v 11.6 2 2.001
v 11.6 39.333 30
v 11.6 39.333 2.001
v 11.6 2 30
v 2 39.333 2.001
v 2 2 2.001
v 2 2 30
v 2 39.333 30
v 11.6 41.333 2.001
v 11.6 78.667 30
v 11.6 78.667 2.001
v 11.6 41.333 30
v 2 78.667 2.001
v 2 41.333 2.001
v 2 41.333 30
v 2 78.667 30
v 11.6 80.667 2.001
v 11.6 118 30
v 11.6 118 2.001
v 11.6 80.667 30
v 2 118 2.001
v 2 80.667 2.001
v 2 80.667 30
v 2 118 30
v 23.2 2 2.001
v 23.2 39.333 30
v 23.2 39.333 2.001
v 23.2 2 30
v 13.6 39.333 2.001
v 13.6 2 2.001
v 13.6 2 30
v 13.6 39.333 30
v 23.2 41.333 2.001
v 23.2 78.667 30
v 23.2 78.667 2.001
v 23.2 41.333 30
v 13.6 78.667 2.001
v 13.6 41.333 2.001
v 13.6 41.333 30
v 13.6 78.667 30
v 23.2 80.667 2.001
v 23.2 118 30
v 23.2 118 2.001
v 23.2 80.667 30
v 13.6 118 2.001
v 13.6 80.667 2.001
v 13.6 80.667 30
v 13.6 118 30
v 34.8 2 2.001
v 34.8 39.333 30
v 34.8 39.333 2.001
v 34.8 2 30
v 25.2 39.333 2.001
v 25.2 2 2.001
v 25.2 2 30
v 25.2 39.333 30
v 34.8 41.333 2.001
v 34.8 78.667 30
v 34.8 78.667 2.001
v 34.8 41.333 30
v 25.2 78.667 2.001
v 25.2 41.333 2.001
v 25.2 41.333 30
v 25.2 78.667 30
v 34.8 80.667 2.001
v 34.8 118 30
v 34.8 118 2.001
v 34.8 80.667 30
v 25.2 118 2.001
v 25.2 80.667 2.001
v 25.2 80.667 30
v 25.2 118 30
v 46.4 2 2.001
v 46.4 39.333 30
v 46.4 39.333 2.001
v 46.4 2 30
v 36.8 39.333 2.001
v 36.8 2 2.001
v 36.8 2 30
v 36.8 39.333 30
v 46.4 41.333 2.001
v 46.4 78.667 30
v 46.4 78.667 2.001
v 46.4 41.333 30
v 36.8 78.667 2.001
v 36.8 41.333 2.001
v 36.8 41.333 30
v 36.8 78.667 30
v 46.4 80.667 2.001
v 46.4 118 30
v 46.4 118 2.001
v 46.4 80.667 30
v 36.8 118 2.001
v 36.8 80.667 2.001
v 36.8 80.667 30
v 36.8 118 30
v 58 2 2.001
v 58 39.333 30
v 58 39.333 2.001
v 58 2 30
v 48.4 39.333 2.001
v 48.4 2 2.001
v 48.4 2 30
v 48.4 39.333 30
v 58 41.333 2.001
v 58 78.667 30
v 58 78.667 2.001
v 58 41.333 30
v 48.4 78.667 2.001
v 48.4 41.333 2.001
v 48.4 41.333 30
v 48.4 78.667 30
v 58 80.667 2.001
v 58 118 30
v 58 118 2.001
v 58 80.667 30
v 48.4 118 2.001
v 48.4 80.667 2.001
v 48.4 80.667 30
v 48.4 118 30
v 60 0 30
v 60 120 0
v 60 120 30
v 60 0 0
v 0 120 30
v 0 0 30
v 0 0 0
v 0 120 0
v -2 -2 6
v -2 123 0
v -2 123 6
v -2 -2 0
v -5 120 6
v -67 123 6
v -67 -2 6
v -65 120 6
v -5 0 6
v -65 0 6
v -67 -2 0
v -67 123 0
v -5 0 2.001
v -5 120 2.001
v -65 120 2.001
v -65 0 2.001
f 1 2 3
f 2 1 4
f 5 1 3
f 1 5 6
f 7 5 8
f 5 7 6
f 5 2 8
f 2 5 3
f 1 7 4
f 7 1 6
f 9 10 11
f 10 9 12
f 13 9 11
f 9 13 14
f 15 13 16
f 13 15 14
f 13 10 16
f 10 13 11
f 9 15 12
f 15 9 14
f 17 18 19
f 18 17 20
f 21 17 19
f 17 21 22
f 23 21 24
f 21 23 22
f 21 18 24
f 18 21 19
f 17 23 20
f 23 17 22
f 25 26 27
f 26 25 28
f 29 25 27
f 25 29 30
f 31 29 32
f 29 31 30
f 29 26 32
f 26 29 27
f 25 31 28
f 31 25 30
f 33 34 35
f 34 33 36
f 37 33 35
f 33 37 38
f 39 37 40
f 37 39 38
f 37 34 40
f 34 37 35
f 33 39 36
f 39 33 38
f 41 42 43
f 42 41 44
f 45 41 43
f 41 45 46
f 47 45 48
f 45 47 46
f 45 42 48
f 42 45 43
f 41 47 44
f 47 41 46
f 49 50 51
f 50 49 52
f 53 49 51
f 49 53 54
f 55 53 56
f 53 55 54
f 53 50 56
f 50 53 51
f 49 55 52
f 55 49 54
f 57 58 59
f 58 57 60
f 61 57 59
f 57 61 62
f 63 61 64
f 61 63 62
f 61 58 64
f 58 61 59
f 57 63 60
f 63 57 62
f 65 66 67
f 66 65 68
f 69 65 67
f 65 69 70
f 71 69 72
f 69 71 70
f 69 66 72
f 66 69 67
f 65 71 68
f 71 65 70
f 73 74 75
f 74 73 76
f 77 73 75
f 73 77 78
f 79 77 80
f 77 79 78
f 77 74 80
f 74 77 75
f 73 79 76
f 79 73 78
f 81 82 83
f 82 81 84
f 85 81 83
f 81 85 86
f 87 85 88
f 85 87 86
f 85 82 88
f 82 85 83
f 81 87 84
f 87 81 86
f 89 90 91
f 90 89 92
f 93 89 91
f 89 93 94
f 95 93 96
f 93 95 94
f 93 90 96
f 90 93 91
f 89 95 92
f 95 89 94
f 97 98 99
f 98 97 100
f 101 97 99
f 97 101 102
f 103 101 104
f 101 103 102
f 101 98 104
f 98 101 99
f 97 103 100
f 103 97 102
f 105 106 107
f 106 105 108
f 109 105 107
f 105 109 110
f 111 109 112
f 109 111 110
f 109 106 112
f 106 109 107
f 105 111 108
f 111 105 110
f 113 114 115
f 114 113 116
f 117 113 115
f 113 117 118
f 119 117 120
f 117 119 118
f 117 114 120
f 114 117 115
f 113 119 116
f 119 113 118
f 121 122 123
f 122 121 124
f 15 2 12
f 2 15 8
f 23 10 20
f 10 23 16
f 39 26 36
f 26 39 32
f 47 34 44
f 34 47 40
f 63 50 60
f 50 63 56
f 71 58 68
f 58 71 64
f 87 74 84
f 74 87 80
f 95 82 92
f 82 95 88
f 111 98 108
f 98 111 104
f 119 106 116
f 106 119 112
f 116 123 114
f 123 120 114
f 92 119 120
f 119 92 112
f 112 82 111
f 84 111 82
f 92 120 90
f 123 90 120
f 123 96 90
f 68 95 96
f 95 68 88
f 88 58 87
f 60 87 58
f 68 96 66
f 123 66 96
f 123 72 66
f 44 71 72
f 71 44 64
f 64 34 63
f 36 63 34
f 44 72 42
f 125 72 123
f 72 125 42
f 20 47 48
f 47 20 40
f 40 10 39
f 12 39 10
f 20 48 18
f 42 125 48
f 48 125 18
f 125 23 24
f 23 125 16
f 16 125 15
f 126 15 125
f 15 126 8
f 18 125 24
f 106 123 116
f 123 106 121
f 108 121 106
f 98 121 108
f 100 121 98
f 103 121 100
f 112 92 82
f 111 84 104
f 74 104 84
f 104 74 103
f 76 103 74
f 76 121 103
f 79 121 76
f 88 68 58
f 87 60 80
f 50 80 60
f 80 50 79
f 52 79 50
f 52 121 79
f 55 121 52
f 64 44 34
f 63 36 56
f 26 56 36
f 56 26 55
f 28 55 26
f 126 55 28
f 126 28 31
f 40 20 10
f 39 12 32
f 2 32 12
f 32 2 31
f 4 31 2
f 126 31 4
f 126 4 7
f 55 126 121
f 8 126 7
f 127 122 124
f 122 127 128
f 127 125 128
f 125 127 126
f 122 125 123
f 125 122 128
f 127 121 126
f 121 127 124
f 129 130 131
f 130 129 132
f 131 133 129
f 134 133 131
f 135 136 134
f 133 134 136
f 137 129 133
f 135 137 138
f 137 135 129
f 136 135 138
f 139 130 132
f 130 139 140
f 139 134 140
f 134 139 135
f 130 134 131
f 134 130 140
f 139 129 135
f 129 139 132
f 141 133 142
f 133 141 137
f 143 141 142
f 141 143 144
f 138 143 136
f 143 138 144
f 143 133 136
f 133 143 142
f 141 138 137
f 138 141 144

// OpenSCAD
//Box Depth (X)
x=60;

//Box Thickness (Y)
y=120;

//Box Height (Z)
z=30;

//Box Wall Thickness
h=2;

//Number of Rows
r=5;

//Number of Columns
c=3;

$fn=100;

module Body()
{cube([x,y,z]);}

module Lid()
{difference(){
    cube([x+1+2*h,y+1+2*h,z/5]);
    translate([h,h,h+.001])cube([x,y,(z/5-h)]);
    }
}

module Hole (){
cube([((x-h-r*(h))/r),(y-h-c*(h))/(c),z-h]);}

module Pattern (){
    for (i=[1:r]){
        for (j=[1:c]){
            translate ([h*(i)+(i-1)*(x-h-r*(h))/r,h*(j)+(j-1)*(y-h-c*(h))/(c),h+.001])Hole();
        }
    }}
difference ()
{Body();
    Pattern();}

translate ([-x-5-h,-h,0])Lid();   
    
